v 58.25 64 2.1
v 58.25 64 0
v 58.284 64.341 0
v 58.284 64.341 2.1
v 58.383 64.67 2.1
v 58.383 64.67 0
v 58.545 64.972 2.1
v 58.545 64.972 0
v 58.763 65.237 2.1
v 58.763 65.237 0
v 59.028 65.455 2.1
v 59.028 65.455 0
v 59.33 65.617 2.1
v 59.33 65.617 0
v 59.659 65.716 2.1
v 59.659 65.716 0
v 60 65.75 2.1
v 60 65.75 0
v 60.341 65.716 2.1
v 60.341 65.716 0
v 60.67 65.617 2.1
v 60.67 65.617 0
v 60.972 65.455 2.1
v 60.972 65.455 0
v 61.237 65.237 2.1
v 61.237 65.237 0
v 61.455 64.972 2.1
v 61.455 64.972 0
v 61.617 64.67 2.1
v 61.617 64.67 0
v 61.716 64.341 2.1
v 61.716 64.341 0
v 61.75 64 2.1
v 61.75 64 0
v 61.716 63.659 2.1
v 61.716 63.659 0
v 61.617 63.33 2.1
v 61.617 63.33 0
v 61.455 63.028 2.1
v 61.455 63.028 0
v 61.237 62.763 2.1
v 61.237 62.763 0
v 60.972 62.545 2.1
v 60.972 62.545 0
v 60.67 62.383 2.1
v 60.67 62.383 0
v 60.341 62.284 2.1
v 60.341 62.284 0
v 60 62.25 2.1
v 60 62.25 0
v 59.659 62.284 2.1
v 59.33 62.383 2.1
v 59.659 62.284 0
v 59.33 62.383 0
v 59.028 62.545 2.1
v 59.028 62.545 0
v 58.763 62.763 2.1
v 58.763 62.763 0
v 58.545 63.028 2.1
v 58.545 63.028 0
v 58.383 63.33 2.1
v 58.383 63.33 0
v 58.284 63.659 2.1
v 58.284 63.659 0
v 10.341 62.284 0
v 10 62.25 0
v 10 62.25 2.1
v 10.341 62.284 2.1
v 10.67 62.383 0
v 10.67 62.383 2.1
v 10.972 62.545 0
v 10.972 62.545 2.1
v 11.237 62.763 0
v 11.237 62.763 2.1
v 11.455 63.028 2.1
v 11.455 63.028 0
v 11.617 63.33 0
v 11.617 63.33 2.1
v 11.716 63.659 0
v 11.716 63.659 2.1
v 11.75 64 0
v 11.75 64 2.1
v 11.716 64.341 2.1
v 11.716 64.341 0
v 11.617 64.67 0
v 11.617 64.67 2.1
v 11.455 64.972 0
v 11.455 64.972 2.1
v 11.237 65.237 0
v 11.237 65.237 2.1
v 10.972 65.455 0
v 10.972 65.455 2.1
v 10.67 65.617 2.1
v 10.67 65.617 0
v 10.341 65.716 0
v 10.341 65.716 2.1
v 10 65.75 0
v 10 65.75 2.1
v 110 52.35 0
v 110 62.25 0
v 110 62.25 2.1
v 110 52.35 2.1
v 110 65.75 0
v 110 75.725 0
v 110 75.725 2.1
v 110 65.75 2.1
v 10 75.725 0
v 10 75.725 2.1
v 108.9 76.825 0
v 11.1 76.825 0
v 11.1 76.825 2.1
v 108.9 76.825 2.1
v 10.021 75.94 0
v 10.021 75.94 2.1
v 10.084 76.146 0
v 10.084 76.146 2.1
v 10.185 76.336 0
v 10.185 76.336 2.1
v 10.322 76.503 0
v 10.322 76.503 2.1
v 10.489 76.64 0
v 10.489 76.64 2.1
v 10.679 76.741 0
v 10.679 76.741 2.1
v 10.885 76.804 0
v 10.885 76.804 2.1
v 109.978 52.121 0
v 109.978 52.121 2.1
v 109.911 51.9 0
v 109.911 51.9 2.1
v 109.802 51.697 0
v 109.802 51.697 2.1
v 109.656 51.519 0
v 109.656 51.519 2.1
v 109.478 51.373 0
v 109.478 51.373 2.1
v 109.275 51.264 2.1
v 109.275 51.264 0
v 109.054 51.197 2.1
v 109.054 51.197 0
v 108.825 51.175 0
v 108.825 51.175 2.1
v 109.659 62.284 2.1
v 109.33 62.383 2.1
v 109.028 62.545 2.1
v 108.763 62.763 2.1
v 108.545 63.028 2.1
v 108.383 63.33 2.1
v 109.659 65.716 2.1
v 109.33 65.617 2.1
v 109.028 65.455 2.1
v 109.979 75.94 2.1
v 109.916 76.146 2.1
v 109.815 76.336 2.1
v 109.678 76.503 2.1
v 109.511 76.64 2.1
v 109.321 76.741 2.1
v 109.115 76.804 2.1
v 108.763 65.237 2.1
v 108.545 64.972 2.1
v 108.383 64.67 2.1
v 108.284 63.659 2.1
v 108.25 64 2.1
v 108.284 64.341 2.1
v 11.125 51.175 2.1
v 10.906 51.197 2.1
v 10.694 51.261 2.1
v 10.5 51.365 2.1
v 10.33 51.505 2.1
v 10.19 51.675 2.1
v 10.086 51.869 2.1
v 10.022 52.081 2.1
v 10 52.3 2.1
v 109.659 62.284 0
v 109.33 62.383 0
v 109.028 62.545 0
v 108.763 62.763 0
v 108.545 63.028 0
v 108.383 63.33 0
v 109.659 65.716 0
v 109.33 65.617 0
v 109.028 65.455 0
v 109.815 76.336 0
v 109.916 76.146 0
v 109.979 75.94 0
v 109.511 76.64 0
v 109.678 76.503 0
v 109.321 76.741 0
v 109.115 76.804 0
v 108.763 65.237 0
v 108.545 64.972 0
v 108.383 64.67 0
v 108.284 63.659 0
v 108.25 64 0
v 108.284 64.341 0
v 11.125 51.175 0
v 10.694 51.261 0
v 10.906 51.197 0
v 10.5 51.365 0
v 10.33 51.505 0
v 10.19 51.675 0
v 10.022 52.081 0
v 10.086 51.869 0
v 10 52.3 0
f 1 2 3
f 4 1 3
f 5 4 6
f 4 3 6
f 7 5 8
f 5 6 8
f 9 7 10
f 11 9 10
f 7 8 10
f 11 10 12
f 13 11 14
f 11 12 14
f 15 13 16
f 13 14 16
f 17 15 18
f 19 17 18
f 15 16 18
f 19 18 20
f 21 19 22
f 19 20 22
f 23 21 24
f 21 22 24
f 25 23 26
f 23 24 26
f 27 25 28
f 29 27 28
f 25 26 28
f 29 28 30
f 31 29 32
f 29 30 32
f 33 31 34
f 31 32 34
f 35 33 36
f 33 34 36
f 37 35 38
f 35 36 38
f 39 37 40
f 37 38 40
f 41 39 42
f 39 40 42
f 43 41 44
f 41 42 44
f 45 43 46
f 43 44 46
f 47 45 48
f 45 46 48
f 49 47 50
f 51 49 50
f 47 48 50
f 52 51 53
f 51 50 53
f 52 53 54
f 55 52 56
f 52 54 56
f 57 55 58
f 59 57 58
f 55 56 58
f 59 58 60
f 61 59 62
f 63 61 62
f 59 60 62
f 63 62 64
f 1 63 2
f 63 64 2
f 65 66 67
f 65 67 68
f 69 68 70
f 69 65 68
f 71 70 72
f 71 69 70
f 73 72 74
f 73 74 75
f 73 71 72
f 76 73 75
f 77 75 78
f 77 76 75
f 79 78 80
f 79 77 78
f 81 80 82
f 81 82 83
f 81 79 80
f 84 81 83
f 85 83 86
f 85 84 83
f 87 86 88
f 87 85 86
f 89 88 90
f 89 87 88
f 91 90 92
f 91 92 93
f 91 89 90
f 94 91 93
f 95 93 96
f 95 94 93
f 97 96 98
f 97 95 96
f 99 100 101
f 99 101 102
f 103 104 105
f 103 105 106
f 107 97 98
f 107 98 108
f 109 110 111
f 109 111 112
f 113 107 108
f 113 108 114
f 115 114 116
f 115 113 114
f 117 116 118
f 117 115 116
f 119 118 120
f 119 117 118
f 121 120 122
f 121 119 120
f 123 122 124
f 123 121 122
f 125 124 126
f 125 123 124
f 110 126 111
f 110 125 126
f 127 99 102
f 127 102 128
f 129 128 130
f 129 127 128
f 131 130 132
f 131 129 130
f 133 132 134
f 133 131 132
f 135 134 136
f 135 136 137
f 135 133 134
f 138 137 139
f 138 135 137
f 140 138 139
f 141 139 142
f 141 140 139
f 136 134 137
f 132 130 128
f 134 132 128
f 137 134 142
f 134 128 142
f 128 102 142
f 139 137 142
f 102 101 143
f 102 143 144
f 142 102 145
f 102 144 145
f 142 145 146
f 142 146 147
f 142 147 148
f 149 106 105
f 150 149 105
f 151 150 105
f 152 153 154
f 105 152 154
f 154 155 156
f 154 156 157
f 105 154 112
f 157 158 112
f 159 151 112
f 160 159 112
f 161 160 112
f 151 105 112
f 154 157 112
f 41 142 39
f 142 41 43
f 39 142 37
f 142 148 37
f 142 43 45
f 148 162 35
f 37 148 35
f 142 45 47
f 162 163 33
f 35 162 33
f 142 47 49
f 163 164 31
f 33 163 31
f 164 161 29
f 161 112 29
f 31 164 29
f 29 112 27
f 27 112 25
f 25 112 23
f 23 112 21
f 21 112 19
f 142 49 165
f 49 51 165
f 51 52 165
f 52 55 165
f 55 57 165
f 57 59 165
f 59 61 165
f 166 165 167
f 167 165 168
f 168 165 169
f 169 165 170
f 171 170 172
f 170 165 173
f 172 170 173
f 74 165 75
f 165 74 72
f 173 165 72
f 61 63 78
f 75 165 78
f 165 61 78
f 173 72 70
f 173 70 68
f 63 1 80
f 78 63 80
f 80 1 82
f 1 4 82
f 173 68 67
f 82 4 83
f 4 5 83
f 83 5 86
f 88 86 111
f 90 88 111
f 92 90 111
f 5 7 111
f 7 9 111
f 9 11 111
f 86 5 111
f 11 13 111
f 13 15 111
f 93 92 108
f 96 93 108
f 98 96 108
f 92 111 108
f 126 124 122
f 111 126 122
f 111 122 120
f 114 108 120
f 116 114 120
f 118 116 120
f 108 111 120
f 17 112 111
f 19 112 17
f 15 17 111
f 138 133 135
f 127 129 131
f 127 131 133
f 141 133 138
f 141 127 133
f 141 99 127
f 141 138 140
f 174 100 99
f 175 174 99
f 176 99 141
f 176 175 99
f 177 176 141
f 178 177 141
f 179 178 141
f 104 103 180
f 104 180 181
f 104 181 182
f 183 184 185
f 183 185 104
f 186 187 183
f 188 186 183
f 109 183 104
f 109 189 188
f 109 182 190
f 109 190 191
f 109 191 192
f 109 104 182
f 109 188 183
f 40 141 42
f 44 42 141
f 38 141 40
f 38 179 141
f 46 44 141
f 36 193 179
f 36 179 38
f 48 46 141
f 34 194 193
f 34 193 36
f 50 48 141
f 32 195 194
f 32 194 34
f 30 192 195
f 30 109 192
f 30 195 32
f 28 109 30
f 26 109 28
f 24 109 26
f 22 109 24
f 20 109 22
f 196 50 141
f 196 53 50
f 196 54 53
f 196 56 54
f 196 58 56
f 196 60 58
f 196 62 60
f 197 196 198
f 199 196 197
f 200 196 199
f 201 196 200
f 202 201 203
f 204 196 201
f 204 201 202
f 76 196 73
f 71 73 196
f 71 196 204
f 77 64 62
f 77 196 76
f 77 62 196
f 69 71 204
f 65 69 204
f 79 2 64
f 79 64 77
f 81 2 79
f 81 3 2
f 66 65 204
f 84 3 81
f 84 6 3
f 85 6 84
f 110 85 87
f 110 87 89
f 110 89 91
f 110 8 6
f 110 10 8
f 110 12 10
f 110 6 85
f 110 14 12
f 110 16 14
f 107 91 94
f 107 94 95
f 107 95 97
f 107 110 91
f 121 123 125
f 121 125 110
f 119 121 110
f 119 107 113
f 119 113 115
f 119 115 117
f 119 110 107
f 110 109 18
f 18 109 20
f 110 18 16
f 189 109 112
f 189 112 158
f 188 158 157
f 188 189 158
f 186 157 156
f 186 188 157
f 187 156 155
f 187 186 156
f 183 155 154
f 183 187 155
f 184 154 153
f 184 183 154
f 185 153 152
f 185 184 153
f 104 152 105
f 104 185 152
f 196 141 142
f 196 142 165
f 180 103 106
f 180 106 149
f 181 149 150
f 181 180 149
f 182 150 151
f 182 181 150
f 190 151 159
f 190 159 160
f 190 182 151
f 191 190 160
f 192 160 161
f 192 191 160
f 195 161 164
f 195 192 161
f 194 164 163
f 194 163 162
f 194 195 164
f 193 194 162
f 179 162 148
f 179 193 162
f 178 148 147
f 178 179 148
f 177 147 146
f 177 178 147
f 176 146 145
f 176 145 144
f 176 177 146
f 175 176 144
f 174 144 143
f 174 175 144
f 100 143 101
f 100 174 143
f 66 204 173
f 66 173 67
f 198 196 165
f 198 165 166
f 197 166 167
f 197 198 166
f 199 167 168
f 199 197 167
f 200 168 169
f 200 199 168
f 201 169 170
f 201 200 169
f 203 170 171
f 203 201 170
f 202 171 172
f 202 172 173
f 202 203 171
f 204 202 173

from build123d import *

# Parameters (mm, degrees)
SKETCH_1_R      = 1.74999904
EXTRUDE_1_DEPTH = 2.1


with BuildPart() as part:
    # Эскиз1 → Бобышка-Вытянуть1 (new body)
    with BuildSketch(Plane(origin=(0, 0, 0), x_dir=(-1, 0, 0), z_dir=(0, 0, -1))):
        with BuildLine():
            Line((-10, 52.299986006), (-10, 60.949899147))
            Line((-10, 60.949899147), (-10, 62.250001907))
            ThreePointArc((-10, 62.250001907), (-11.75, 64.000001907), (-10, 65.750001907))
            Line((-10, 65.750001907), (-10, 67.050104668))
            Line((-10, 67.050104668), (-10, 75.724998474))
            ThreePointArc((-10, 75.724998474), (-10.321999748, 76.50299855), (-11.100000381, 76.824996948))
            Line((-11.100000381, 76.824996948), (-108.900001526, 76.824996948))
            ThreePointArc((-108.900001526, 76.824996948), (-109.678001404, 76.502998352), (-110, 75.724998474))
            Line((-110, 75.724998474), (-110, 67.049927724))
            Line((-110, 67.049927724), (-110, 65.750001907))
            ThreePointArc((-110, 65.750001907), (-108.25, 64.000001907), (-110, 62.250001907))
            Line((-110, 62.250001907), (-110, 60.950076091))
            Line((-110, 60.950076091), (-110, 52.349998474))
            ThreePointArc((-110, 52.349998474), (-109.655996881, 51.518999658), (-108.824996948, 51.174999237))
            Line((-108.824996948, 51.174999237), (-11.124986768, 51.174999237))
            ThreePointArc((-11.124986768, 51.174999237), (-10.329500996, 51.504500233), (-10, 52.299986006))
        make_face()
        with Locations((-59.99999938, 63.999999)):
            Circle(SKETCH_1_R, mode=Mode.SUBTRACT)
    extrude(amount=-EXTRUDE_1_DEPTH)


solid = part.part
